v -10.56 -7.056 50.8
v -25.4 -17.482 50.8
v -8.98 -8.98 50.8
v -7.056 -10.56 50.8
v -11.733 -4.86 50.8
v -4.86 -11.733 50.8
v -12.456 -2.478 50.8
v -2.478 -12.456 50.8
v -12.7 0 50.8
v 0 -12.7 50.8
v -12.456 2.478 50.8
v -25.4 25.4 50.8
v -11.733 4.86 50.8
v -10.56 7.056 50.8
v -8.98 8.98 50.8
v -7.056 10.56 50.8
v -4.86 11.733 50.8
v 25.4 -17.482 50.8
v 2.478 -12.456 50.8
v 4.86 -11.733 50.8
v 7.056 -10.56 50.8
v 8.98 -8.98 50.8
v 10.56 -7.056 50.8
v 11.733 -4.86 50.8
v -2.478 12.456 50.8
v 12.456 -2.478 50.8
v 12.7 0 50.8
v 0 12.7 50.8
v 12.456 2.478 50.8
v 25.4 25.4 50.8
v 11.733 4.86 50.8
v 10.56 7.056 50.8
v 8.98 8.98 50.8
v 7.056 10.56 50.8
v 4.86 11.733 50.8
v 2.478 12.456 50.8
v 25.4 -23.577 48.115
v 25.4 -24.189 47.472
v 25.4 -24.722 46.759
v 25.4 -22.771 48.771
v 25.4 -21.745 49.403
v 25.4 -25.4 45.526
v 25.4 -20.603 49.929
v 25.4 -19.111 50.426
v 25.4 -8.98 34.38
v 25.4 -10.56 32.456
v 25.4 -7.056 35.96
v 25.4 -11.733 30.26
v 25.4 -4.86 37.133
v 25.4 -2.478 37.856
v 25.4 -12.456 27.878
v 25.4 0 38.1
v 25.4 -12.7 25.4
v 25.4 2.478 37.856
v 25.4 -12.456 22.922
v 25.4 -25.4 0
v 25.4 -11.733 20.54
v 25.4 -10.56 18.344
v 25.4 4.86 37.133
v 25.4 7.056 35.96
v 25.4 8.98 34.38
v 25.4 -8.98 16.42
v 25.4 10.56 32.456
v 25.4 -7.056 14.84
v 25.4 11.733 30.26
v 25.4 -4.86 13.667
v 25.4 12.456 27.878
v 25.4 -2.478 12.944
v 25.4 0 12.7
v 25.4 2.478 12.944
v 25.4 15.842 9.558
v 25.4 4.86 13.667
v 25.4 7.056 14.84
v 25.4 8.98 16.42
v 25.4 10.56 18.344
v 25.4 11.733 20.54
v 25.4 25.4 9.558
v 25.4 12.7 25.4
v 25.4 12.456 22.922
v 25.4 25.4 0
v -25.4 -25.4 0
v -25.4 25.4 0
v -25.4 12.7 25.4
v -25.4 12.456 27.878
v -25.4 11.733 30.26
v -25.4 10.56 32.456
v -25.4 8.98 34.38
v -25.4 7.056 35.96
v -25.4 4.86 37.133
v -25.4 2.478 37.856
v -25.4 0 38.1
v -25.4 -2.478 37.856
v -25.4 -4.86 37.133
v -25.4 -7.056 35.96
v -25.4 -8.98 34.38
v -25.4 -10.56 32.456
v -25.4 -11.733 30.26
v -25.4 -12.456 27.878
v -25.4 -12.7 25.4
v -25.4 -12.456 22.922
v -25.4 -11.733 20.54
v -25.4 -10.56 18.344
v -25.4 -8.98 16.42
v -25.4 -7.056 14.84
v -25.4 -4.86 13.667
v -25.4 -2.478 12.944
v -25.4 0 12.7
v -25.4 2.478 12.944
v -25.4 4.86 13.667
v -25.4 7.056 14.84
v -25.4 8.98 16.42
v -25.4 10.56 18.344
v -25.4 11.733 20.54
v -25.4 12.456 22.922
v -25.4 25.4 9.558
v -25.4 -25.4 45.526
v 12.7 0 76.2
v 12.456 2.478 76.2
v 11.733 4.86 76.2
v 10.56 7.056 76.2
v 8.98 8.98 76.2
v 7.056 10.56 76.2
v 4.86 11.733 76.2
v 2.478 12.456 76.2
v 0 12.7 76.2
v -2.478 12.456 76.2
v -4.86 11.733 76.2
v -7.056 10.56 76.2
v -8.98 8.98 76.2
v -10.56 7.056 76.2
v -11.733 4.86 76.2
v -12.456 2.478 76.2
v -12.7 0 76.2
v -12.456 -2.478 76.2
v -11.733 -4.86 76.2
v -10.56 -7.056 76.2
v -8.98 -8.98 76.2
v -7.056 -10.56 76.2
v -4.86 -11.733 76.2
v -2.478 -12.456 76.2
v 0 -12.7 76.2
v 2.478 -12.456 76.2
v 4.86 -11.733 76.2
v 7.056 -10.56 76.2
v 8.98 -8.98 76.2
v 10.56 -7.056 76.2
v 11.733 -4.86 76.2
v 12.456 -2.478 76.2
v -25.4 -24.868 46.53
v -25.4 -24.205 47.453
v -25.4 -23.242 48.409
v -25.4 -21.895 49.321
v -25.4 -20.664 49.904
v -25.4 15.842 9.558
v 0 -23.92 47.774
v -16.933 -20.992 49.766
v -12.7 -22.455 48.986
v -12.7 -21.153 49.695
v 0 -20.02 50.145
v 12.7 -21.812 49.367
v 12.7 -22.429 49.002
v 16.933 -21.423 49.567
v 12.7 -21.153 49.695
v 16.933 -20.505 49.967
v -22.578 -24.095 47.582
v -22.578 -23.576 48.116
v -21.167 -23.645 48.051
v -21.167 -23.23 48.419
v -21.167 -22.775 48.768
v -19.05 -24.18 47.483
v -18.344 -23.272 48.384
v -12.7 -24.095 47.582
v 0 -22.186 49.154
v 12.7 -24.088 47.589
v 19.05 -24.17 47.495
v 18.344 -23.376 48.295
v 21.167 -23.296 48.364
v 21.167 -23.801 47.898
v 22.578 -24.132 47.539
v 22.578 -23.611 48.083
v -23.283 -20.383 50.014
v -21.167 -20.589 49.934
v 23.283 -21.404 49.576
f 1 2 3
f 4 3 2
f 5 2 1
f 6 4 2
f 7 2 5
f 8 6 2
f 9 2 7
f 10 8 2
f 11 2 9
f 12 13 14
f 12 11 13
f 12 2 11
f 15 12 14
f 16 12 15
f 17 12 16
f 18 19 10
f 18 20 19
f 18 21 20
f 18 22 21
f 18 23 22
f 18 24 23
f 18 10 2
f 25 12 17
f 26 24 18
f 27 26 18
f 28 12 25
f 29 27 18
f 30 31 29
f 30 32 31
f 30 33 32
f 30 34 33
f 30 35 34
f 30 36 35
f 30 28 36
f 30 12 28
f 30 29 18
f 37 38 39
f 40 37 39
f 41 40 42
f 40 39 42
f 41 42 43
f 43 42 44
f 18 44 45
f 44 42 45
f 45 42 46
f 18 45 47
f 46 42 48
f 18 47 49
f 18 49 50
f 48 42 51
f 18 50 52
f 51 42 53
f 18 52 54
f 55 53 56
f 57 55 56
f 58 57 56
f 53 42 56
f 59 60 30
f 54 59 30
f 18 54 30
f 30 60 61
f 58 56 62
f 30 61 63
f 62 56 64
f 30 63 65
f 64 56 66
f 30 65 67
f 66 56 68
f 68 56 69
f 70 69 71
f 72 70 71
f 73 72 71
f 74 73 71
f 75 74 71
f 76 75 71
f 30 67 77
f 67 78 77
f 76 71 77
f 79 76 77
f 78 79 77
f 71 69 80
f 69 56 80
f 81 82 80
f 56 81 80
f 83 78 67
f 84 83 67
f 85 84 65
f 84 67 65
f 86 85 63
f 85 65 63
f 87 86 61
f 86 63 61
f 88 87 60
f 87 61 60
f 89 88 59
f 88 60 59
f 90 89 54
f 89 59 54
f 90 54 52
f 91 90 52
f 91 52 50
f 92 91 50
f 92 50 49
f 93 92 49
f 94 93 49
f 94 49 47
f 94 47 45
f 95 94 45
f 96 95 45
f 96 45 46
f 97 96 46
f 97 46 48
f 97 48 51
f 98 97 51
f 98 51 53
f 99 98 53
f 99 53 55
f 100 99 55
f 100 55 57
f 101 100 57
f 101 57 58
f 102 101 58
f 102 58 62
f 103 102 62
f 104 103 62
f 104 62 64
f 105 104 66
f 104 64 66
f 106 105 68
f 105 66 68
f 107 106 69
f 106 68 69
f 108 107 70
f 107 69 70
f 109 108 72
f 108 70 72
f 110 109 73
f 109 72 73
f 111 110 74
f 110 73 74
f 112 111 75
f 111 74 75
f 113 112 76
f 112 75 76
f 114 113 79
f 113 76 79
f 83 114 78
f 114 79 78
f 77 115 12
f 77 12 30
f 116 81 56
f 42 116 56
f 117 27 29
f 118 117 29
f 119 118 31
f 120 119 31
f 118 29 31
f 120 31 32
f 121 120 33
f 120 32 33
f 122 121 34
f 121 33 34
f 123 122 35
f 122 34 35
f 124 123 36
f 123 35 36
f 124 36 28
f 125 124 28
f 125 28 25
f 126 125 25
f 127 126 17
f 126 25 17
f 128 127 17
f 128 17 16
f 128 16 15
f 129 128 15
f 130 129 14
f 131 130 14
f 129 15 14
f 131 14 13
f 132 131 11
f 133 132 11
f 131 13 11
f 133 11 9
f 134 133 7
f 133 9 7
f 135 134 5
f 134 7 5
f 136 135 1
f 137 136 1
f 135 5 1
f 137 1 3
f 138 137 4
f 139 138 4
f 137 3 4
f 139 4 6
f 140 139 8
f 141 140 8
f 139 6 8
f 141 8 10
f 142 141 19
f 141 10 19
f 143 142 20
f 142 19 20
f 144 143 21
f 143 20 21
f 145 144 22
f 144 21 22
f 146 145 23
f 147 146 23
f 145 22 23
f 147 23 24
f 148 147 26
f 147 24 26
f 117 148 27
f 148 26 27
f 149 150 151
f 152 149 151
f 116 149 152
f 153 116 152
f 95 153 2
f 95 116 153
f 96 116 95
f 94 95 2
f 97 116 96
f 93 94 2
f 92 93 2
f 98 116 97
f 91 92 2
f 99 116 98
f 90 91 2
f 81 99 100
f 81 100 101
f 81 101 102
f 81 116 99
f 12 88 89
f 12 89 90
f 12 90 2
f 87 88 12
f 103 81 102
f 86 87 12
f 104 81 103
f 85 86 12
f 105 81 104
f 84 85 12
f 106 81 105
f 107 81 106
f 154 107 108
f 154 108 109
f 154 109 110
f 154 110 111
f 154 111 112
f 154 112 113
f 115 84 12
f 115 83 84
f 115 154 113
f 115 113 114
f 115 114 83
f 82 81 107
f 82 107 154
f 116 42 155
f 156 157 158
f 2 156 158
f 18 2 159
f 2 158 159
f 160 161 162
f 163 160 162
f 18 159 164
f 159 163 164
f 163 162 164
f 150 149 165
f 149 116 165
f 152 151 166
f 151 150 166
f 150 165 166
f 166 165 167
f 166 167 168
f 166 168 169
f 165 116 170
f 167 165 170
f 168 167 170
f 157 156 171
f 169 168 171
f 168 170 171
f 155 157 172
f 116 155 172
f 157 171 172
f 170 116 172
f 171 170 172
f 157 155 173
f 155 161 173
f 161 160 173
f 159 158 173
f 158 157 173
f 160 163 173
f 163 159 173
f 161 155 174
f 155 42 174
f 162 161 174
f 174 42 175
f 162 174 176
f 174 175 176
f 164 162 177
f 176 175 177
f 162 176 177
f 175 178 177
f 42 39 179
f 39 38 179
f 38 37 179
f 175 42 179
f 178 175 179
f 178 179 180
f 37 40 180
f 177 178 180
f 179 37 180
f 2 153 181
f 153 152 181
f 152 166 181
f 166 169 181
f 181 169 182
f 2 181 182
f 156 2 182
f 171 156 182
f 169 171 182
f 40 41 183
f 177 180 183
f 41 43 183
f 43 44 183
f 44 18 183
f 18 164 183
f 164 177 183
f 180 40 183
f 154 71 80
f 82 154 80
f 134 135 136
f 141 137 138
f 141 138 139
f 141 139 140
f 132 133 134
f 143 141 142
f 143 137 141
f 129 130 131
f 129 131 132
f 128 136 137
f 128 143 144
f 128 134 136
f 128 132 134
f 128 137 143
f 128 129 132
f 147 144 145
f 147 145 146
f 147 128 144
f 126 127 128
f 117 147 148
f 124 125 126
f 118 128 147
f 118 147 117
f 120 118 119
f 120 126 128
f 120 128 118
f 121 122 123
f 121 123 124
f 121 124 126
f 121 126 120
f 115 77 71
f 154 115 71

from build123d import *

# Parameters (mm, degrees)
F0_W     = 50.8
F0_H     = 50.8
F1_DEPTH = 50.8
F2_R     = 12.7
F3_DEPTH = 25.4
F4_R     = 12.7
F5_DEPTH = 99.06
F7_DEPTH = 60.452
F9_DEPTH = 52.7812


with BuildPart() as f1:
    # F0 (on Top) → F1 (new body)
    with BuildSketch(Plane.XY):
        Rectangle(F0_W, F0_H)
    extrude(amount=F1_DEPTH)

    # F2 (on face) → F3 (join)
    with BuildSketch(Plane.XY.offset(50.8)):
        Circle(F2_R)
    extrude(amount=F3_DEPTH)

    # F4 (on face) → F5 (cut)
    with BuildSketch(Plane.YZ.offset(25.4)):
        with Locations((0, 25.4)):
            Circle(F4_R)
    extrude(amount=-F5_DEPTH, mode=Mode.SUBTRACT)

    # F6 (on face) → F7 (cut)
    with BuildSketch(Plane.YZ.offset(25.4)):
        Polygon((25.4, 9.5578852713), (15.8421147287, 9.5578852713), (25.4, 0), align=None)
    extrude(amount=-F7_DEPTH, mode=Mode.SUBTRACT)

    # F8 (on face) → F9 (cut)
    with BuildSketch(Plane.YZ.offset(25.4)):
        with BuildLine():
            Line((-25.4, 50.8), (-25.4, 45.5264649071))
            add(Edge.make_bspline(
                [(-25.4, 45.5264649071), (-25.015397773, 46.373642787), (-23.3269839792, 48.9886268104), (-20.1866213816, 50.2950406875), (-17.4815941819, 50.8)],
                knots=[0.4167679889, 0.4167679889, 0.4167679889, 0.4167679889, 0.4909297507, 0.6737476918, 0.6737476918, 0.6737476918, 0.6737476918], degree=3))
            Line((-17.4815941819, 50.8), (-25.4, 50.8))
        make_face()
    extrude(amount=-F9_DEPTH, mode=Mode.SUBTRACT)


solid = f1.part
